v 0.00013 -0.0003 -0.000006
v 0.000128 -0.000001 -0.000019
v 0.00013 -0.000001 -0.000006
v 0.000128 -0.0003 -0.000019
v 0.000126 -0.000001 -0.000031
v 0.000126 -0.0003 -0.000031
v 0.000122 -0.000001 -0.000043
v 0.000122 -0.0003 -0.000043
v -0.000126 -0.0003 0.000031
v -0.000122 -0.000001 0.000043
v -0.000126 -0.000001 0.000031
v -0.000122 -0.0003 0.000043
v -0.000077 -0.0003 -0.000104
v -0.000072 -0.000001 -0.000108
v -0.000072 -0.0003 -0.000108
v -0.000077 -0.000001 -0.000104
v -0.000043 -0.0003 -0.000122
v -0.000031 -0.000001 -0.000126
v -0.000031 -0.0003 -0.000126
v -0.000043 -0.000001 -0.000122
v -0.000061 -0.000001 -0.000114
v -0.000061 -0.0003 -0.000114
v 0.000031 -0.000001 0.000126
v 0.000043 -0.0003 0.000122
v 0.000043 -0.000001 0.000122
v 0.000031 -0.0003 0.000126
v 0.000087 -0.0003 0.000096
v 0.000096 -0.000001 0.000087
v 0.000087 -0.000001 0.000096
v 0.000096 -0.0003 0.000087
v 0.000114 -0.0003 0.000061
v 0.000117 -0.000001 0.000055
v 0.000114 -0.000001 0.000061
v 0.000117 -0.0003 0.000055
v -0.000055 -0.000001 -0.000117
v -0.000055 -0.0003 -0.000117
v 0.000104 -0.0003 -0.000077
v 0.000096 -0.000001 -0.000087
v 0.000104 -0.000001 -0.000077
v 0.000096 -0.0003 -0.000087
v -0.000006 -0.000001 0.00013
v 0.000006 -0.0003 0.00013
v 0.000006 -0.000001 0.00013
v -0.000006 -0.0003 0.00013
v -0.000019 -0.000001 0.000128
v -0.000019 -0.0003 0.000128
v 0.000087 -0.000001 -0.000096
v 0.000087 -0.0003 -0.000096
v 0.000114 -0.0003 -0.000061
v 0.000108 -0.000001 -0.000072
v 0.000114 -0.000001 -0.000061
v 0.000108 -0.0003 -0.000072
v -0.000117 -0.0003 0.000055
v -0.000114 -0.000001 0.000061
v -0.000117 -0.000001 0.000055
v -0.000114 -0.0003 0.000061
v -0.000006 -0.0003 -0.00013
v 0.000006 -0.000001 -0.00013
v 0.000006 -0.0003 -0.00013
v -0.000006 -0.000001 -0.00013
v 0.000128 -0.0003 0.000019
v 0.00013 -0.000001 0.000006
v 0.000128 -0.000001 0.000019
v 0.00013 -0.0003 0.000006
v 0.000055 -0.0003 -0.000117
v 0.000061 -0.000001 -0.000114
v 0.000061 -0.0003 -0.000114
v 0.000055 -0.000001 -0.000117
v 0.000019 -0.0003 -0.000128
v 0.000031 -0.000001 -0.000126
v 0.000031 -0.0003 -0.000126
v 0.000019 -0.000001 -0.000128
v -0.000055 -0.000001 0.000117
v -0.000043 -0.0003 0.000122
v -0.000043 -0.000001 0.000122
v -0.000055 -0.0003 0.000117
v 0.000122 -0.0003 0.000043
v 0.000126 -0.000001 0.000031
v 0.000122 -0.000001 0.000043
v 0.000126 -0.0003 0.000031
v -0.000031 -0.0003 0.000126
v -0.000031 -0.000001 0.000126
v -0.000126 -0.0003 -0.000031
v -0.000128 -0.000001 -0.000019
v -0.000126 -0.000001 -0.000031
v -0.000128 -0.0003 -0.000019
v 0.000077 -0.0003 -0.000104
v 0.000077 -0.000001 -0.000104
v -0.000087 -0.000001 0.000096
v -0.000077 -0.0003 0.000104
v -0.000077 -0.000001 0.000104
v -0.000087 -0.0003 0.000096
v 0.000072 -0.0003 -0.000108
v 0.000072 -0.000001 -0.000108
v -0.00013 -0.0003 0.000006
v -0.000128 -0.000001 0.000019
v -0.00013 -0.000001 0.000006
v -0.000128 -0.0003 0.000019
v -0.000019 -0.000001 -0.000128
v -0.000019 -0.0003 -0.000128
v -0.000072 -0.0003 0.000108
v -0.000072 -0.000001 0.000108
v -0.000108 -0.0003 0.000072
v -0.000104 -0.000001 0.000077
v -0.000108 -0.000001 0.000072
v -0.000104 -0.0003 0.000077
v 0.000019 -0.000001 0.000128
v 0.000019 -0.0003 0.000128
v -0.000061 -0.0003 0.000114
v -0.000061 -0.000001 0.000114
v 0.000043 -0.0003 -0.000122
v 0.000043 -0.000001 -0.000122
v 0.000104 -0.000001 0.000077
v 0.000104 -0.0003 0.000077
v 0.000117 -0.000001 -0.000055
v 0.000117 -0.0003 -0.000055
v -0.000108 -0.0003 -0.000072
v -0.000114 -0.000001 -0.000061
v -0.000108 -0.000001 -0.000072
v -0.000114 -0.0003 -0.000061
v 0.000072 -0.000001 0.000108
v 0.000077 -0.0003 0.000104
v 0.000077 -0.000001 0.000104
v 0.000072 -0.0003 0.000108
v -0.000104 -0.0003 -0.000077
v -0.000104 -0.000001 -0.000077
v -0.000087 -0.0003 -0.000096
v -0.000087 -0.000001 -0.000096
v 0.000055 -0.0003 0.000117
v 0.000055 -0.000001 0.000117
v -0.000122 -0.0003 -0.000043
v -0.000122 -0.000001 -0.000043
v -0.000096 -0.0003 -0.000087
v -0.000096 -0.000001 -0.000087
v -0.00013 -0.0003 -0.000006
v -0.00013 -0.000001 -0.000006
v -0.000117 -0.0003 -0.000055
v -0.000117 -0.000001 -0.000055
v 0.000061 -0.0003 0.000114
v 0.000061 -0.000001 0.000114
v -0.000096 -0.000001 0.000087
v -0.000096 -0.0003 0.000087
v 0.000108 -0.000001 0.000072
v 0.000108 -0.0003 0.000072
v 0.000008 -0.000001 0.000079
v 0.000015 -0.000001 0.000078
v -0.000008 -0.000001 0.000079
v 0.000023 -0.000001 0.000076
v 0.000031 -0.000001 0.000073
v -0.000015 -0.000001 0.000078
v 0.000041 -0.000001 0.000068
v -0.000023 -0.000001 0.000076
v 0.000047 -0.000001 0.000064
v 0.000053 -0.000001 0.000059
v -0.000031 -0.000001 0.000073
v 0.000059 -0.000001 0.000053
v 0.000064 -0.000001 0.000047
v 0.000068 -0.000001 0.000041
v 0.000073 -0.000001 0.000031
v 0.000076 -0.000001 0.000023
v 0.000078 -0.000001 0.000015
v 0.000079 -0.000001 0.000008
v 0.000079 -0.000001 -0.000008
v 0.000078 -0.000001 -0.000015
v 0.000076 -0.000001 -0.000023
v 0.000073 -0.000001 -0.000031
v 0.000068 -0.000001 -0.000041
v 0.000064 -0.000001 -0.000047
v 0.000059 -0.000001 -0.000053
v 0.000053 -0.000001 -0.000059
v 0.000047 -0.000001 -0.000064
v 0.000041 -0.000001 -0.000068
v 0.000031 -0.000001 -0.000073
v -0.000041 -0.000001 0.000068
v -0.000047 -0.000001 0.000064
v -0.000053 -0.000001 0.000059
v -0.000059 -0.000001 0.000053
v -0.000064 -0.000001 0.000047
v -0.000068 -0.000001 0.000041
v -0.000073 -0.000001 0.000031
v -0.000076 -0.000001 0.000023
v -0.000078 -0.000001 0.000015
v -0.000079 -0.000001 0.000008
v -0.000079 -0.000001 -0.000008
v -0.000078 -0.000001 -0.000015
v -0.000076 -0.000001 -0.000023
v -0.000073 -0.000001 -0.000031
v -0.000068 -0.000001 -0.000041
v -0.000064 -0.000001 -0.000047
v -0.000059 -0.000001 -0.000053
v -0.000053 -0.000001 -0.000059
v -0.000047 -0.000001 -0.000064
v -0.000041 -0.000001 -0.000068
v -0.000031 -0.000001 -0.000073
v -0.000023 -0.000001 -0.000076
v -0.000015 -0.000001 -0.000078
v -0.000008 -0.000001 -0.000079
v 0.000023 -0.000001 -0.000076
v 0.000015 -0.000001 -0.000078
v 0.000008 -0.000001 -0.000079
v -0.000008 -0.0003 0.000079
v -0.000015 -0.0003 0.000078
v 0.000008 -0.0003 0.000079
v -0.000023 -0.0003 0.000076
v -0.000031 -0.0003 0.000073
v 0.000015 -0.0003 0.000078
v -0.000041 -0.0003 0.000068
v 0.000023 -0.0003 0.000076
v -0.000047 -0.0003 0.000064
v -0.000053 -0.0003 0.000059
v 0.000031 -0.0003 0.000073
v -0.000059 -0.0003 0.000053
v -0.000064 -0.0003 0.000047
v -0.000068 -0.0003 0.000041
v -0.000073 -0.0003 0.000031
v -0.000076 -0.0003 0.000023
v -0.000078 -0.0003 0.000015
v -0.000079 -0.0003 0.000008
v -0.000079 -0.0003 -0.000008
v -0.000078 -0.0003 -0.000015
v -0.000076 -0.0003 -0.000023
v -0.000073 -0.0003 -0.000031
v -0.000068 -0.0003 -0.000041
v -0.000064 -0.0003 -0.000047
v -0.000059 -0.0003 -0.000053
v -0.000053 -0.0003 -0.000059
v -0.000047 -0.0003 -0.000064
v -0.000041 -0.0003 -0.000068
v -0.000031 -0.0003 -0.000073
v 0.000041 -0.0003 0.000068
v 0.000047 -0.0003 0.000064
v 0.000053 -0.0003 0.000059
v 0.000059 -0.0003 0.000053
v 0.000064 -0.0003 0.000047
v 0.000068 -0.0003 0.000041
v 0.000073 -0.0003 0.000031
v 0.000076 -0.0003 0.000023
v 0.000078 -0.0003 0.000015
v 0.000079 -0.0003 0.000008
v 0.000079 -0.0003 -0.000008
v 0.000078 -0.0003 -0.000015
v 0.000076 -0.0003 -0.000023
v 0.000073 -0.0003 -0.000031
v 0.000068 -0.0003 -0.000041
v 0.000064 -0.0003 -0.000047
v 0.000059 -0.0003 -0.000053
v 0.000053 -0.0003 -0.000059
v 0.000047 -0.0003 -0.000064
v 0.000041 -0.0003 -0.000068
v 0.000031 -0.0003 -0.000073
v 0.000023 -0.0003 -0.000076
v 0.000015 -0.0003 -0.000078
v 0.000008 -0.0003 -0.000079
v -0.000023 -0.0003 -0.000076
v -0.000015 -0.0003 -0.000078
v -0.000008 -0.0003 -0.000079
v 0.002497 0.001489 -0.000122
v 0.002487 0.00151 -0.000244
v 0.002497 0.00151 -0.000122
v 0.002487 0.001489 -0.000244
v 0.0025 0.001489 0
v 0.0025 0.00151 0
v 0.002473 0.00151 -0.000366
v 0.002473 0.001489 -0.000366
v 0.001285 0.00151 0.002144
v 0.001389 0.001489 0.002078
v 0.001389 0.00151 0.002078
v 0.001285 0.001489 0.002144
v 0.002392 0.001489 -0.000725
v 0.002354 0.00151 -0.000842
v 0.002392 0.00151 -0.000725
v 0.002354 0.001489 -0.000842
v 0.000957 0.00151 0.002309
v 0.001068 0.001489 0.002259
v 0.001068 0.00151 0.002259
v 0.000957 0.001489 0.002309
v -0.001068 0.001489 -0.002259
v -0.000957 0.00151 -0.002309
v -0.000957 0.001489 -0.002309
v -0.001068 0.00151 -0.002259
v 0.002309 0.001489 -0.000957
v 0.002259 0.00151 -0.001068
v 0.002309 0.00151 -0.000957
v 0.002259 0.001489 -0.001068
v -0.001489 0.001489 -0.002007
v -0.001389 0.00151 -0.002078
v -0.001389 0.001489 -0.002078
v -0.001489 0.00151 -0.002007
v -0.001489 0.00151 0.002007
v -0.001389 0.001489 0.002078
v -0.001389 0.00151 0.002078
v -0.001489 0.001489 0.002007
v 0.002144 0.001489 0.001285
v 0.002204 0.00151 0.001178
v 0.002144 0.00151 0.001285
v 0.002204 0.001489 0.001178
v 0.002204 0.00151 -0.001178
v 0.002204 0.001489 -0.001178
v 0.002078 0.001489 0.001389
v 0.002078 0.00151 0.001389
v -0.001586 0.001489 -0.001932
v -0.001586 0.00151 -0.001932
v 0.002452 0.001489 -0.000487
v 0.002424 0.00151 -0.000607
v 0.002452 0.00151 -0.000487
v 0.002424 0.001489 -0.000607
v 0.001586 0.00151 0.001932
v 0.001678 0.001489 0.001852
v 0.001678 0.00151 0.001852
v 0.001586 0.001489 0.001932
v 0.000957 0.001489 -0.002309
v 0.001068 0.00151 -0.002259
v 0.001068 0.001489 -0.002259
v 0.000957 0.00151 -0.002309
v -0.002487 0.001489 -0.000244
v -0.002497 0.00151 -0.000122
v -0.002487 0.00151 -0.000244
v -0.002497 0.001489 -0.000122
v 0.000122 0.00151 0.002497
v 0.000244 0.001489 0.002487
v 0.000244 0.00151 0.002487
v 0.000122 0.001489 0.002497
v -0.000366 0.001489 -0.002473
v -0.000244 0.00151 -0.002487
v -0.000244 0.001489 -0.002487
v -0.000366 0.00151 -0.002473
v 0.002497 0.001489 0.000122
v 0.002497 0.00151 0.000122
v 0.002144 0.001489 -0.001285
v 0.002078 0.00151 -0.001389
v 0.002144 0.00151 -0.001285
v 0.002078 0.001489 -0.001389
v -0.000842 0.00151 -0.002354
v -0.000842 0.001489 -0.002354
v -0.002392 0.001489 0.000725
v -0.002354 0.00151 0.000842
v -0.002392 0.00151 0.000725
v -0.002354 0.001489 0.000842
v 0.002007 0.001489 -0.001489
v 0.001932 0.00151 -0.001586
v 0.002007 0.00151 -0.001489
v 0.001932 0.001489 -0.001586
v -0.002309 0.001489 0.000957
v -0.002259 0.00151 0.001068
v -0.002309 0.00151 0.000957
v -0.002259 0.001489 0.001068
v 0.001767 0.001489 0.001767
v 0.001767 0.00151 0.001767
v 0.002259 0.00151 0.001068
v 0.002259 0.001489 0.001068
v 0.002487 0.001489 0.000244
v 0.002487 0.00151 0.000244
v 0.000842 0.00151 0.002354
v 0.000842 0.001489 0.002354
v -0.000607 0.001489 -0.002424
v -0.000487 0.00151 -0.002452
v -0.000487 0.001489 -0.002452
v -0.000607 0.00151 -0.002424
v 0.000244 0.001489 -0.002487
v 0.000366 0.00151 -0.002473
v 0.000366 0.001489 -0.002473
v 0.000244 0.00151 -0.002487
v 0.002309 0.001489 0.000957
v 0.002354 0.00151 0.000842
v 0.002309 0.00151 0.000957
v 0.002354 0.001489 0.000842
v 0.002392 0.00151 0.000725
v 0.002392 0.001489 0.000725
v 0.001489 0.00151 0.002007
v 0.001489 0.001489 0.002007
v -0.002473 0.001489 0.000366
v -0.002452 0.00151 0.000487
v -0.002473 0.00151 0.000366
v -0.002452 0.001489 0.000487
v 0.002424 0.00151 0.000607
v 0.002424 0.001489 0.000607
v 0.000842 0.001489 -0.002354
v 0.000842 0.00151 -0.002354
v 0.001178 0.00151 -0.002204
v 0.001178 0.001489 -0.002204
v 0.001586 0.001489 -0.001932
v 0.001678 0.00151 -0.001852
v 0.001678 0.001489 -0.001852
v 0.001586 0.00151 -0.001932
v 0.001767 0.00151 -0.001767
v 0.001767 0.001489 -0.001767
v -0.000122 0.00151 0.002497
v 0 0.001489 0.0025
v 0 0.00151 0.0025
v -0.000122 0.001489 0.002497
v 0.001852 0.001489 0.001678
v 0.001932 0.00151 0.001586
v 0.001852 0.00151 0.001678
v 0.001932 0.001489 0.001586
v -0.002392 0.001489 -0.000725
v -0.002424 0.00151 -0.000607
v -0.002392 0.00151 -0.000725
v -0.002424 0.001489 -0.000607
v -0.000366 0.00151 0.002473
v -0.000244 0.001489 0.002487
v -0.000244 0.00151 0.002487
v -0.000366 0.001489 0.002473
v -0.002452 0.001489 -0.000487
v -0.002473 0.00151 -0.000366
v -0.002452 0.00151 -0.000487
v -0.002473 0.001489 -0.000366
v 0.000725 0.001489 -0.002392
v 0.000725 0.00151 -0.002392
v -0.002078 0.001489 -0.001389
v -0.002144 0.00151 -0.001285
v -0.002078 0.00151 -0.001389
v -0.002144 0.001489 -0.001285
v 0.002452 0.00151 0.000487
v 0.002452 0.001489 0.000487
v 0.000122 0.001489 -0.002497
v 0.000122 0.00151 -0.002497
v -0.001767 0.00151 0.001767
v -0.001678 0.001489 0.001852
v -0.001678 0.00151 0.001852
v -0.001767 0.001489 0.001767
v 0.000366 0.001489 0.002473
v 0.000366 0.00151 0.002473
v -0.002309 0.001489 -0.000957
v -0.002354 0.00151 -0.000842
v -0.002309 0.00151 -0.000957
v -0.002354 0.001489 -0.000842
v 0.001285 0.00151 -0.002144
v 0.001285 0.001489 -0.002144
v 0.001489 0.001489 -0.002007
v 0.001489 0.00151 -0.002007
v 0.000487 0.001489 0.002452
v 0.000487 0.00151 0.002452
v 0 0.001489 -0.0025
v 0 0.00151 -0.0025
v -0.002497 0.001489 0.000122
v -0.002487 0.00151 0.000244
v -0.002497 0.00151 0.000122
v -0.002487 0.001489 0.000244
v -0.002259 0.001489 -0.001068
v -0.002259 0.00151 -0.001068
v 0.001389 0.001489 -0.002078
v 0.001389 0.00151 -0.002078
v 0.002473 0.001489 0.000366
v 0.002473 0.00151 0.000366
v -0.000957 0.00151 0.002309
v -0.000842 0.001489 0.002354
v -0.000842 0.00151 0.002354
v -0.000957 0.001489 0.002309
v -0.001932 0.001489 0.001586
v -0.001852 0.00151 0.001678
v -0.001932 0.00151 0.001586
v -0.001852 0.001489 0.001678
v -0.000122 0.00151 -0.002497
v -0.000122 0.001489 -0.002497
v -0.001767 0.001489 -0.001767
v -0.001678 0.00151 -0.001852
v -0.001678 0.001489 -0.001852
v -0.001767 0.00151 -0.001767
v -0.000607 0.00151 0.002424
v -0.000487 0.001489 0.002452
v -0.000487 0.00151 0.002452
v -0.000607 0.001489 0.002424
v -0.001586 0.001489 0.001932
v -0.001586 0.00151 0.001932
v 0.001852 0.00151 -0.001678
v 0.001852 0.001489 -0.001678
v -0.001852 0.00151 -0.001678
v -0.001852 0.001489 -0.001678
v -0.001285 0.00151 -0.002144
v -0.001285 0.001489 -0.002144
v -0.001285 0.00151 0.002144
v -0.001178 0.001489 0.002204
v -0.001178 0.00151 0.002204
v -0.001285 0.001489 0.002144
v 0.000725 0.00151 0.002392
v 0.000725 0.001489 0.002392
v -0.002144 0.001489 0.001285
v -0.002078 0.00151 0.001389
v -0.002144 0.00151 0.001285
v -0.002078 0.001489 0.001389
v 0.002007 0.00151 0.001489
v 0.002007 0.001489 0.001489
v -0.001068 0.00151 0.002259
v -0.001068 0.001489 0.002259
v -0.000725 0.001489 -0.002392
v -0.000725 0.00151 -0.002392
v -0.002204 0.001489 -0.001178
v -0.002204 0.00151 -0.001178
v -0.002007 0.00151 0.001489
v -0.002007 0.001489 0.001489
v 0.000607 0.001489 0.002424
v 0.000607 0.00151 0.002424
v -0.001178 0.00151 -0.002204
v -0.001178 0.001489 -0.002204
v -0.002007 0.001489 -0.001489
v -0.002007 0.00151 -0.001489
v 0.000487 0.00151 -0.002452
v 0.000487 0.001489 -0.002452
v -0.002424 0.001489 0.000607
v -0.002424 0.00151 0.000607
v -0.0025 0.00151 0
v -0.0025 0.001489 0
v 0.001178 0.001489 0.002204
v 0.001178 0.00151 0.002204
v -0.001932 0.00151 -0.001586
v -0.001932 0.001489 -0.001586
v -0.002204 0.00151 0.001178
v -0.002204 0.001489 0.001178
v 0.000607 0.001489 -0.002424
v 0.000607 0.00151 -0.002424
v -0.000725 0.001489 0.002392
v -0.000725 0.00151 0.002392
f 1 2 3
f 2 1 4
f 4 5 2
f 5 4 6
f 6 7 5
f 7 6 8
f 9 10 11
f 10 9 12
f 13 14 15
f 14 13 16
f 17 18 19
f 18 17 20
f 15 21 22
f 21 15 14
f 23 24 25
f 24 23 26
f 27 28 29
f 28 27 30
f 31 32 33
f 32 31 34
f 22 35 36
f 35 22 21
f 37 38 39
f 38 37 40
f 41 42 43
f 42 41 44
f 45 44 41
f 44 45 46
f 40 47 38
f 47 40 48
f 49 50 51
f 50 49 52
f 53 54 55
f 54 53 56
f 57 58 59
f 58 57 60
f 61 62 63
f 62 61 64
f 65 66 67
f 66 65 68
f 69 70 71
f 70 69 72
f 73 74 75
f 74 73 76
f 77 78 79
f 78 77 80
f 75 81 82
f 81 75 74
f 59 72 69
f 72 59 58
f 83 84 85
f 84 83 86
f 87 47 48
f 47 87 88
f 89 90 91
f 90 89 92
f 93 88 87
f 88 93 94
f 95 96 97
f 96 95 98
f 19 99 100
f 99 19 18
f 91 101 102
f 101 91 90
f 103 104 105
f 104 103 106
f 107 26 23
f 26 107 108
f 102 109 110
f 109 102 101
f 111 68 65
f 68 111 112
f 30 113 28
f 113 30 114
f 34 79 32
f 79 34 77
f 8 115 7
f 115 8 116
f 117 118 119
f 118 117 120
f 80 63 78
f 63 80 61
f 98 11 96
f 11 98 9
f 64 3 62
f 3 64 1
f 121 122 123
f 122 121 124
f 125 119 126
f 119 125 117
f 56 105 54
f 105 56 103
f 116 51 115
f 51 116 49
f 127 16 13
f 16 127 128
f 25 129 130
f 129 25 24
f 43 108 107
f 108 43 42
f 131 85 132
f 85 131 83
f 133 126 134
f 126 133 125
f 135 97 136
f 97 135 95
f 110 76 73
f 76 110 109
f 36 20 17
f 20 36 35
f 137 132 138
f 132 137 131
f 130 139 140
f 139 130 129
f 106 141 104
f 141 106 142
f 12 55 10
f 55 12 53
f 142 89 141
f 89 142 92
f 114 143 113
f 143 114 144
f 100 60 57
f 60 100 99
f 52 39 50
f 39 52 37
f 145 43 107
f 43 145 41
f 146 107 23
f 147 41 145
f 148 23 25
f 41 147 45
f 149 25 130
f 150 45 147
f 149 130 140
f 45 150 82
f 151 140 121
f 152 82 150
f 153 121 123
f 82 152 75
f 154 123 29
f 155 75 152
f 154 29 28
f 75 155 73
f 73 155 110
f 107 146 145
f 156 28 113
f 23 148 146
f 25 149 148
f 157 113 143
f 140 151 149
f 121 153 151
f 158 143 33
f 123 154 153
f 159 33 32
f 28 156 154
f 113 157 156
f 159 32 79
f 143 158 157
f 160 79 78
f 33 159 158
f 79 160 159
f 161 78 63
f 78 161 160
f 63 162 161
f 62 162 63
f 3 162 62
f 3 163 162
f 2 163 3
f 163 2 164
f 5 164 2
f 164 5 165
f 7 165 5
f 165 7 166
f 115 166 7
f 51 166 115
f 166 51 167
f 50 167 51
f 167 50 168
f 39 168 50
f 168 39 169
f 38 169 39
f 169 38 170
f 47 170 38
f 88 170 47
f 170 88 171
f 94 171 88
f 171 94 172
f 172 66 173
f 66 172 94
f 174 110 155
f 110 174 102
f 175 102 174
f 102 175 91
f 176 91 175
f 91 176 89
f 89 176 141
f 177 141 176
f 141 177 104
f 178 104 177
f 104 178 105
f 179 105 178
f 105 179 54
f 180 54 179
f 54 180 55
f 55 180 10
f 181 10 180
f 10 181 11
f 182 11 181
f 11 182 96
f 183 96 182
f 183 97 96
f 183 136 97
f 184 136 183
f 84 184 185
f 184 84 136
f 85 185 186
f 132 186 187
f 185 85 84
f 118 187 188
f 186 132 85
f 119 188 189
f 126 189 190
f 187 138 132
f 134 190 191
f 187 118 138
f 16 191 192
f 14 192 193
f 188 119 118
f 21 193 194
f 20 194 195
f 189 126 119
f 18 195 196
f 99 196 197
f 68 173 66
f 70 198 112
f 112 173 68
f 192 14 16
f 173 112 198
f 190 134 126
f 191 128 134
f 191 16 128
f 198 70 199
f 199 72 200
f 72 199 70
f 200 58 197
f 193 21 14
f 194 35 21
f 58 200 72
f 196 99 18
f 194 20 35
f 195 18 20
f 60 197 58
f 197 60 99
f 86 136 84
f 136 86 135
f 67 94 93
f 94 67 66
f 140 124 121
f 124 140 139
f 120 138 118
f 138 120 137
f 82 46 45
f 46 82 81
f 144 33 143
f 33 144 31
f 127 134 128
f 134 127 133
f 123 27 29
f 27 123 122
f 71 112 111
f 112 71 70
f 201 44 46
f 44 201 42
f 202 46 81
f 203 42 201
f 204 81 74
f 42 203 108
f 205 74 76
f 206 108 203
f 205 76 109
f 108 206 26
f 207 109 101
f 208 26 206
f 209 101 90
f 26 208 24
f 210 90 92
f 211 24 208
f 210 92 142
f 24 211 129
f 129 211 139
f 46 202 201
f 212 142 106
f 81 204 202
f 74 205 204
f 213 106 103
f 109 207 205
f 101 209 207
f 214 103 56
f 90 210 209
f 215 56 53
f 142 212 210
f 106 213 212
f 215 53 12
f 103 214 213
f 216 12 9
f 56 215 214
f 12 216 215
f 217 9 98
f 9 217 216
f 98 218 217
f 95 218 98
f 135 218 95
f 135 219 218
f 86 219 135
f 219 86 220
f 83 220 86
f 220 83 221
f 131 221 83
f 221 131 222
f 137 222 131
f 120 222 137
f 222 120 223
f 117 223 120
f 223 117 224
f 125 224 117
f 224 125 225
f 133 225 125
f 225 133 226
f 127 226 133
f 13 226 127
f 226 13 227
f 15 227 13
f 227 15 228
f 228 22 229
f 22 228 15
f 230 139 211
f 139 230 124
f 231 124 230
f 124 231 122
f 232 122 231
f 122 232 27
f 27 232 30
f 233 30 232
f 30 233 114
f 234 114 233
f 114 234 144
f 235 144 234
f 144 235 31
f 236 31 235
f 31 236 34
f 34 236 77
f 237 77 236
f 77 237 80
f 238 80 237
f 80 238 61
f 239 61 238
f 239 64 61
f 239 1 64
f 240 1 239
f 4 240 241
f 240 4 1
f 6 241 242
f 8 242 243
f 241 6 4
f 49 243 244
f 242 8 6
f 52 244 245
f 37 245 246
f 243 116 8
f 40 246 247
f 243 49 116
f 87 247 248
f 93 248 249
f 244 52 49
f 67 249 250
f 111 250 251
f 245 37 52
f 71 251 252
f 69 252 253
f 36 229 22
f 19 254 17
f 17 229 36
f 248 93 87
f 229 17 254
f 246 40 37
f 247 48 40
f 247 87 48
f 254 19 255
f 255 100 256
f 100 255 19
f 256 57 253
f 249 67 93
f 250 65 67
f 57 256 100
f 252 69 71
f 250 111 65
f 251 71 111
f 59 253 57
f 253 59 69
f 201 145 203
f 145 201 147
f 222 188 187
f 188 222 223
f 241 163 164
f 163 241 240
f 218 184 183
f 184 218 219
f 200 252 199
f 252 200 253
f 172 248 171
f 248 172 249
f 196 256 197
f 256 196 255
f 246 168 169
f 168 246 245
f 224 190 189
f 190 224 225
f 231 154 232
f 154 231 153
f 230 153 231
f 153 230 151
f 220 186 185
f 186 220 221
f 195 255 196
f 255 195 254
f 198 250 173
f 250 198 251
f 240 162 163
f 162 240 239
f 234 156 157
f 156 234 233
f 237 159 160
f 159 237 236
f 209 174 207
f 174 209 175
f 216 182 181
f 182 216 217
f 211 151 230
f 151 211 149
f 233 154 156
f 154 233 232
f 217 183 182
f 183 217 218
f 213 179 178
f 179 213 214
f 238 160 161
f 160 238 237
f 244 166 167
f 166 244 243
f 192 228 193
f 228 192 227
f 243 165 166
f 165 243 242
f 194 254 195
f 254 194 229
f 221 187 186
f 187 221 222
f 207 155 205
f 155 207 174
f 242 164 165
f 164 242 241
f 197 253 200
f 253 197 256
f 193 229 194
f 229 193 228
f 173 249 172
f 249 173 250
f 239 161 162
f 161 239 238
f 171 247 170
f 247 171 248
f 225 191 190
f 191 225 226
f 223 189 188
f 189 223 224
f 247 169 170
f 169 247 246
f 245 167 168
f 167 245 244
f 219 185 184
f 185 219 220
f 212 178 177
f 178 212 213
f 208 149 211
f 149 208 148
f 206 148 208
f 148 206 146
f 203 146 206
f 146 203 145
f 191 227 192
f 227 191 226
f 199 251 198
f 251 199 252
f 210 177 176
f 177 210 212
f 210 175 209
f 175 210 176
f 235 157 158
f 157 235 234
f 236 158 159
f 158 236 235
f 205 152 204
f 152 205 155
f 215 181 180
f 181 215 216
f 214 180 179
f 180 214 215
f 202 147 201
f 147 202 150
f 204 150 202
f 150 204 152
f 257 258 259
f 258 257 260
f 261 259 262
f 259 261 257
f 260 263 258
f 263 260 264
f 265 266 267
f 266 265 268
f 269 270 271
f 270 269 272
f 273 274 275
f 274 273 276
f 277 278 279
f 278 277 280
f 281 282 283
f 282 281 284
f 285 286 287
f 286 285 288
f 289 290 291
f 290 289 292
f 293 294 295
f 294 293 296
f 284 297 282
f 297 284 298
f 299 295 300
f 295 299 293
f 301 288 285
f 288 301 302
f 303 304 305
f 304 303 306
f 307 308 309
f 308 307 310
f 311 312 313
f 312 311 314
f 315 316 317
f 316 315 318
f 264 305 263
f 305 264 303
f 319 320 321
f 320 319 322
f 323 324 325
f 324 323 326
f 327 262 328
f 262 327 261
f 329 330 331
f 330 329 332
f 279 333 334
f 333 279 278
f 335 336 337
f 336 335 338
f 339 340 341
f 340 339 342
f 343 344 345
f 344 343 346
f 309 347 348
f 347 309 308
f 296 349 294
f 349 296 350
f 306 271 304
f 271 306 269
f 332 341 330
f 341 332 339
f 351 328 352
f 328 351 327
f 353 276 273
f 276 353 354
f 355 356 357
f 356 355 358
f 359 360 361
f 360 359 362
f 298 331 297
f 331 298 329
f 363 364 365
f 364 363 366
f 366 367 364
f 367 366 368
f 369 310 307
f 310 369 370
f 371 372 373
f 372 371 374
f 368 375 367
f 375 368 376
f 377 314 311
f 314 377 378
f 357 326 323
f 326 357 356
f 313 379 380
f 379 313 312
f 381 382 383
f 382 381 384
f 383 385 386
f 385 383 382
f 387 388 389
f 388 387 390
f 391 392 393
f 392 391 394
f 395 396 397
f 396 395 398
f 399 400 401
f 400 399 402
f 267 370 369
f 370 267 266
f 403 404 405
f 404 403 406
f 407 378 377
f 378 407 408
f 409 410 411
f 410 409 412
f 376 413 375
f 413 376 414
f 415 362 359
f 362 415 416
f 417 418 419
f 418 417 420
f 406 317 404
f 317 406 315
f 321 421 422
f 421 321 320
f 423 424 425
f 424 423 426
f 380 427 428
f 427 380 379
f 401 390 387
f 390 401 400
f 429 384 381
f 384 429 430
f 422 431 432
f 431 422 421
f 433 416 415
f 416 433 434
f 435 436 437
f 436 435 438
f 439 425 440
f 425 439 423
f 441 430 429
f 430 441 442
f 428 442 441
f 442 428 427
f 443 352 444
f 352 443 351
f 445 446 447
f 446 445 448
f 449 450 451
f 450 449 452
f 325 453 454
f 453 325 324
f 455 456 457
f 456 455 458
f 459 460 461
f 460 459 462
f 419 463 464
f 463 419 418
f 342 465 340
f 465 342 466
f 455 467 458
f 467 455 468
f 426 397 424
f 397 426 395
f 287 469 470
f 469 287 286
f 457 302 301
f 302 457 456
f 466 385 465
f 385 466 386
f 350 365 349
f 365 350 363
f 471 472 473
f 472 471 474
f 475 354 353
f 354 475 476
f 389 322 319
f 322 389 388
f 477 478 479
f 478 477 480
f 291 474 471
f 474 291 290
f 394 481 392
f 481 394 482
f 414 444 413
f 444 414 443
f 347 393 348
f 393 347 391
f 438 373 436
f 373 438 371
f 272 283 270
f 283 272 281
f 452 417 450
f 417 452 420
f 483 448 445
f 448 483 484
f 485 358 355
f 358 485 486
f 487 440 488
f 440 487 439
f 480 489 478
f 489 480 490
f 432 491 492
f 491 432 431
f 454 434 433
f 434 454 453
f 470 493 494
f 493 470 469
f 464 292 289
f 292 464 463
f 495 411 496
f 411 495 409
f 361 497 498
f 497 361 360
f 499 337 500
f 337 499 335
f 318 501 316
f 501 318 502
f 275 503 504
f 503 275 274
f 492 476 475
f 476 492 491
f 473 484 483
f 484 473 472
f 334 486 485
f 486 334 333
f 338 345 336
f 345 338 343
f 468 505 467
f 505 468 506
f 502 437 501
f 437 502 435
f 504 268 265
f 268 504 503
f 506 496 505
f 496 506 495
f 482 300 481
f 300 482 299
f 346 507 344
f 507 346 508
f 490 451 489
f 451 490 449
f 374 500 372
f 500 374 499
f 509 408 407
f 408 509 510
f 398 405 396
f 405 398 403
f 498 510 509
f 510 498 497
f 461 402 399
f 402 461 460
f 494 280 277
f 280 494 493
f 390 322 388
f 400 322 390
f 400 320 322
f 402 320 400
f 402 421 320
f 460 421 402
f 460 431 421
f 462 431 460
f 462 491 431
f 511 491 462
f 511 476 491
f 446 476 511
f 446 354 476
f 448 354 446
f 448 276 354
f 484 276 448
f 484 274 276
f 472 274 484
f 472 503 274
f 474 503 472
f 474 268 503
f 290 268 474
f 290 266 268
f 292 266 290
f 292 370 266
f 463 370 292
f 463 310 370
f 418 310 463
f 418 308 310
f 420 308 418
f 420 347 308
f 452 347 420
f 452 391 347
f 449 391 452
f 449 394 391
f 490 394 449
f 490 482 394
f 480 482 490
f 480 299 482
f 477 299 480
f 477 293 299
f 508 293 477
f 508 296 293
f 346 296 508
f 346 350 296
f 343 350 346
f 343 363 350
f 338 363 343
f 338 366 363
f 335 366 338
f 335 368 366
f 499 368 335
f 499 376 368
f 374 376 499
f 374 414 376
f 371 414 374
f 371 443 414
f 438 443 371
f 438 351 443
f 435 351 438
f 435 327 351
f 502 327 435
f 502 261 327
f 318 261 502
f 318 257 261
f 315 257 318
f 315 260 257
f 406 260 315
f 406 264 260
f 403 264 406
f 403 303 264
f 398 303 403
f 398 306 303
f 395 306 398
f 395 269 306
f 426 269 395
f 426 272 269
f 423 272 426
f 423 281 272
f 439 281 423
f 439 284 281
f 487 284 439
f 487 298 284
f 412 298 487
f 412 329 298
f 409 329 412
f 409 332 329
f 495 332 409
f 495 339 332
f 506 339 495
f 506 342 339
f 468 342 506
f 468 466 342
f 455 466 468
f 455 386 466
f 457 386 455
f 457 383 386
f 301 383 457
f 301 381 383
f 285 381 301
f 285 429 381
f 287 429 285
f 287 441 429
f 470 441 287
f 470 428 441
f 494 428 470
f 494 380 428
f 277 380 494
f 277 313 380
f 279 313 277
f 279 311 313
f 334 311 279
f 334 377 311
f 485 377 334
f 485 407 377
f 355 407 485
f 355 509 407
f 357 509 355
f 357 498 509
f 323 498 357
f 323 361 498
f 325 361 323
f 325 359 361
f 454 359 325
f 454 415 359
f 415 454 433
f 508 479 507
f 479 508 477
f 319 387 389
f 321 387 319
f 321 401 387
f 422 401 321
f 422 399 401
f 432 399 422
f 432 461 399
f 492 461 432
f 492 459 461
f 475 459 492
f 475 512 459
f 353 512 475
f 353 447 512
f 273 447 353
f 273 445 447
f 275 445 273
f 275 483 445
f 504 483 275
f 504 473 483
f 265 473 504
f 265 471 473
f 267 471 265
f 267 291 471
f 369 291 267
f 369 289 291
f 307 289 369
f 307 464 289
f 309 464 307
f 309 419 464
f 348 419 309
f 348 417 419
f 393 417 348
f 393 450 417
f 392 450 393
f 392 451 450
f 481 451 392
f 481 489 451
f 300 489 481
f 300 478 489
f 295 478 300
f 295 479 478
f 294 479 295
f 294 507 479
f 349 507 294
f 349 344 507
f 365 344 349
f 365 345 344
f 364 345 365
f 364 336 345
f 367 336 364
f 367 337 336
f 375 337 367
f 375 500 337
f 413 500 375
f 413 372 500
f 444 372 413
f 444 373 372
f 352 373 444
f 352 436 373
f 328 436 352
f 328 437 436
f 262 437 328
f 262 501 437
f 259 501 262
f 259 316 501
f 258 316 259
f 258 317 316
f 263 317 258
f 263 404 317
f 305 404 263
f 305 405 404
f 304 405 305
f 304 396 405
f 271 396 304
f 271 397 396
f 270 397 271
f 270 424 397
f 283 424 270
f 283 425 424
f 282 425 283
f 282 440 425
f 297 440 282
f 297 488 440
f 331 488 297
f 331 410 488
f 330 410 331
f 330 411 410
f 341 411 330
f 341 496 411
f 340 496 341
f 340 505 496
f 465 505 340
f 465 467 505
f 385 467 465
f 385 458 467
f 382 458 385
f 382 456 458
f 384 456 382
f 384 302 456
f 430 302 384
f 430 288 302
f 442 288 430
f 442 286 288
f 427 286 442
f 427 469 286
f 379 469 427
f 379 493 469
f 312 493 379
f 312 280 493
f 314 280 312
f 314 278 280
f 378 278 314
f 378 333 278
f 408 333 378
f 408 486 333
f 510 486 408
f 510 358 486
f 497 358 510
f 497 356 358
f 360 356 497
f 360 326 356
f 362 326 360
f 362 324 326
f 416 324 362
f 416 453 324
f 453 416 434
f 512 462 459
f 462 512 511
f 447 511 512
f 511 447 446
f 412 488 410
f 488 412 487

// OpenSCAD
// Parametric electrospray nozzle/collector geometry.
// Units are meters; OpenSCAD will display them as model units.
inner_diameter = 0.00016;
outer_diameter = 0.00026;
nozzle_length = 0.0003;
collector_distance = 0.0015;
collector_diameter = 0.005;
farfield_radius = 0.0025;
$fn = 128;

module nozzle_electrode() {
  translate([0, -nozzle_length, 0]) rotate([-90,0,0])
  difference() {
    cylinder(h=nozzle_length, d=outer_diameter);
    translate([0,0,-1e-9]) cylinder(h=nozzle_length + 2e-9, d=inner_diameter);
  }
}

module collector_ground() {
  translate([0, collector_distance, 0]) rotate([-90,0,0])
    cylinder(h=outer_diameter*0.08, d=collector_diameter, center=true);
}

module open_atmosphere_hint() {
  %translate([0, (-nozzle_length + collector_distance)/2, 0]) rotate([-90,0,0])
    cylinder(h=nozzle_length + collector_distance, r=farfield_radius);
}

nozzle_electrode();
collector_ground();
open_atmosphere_hint();
